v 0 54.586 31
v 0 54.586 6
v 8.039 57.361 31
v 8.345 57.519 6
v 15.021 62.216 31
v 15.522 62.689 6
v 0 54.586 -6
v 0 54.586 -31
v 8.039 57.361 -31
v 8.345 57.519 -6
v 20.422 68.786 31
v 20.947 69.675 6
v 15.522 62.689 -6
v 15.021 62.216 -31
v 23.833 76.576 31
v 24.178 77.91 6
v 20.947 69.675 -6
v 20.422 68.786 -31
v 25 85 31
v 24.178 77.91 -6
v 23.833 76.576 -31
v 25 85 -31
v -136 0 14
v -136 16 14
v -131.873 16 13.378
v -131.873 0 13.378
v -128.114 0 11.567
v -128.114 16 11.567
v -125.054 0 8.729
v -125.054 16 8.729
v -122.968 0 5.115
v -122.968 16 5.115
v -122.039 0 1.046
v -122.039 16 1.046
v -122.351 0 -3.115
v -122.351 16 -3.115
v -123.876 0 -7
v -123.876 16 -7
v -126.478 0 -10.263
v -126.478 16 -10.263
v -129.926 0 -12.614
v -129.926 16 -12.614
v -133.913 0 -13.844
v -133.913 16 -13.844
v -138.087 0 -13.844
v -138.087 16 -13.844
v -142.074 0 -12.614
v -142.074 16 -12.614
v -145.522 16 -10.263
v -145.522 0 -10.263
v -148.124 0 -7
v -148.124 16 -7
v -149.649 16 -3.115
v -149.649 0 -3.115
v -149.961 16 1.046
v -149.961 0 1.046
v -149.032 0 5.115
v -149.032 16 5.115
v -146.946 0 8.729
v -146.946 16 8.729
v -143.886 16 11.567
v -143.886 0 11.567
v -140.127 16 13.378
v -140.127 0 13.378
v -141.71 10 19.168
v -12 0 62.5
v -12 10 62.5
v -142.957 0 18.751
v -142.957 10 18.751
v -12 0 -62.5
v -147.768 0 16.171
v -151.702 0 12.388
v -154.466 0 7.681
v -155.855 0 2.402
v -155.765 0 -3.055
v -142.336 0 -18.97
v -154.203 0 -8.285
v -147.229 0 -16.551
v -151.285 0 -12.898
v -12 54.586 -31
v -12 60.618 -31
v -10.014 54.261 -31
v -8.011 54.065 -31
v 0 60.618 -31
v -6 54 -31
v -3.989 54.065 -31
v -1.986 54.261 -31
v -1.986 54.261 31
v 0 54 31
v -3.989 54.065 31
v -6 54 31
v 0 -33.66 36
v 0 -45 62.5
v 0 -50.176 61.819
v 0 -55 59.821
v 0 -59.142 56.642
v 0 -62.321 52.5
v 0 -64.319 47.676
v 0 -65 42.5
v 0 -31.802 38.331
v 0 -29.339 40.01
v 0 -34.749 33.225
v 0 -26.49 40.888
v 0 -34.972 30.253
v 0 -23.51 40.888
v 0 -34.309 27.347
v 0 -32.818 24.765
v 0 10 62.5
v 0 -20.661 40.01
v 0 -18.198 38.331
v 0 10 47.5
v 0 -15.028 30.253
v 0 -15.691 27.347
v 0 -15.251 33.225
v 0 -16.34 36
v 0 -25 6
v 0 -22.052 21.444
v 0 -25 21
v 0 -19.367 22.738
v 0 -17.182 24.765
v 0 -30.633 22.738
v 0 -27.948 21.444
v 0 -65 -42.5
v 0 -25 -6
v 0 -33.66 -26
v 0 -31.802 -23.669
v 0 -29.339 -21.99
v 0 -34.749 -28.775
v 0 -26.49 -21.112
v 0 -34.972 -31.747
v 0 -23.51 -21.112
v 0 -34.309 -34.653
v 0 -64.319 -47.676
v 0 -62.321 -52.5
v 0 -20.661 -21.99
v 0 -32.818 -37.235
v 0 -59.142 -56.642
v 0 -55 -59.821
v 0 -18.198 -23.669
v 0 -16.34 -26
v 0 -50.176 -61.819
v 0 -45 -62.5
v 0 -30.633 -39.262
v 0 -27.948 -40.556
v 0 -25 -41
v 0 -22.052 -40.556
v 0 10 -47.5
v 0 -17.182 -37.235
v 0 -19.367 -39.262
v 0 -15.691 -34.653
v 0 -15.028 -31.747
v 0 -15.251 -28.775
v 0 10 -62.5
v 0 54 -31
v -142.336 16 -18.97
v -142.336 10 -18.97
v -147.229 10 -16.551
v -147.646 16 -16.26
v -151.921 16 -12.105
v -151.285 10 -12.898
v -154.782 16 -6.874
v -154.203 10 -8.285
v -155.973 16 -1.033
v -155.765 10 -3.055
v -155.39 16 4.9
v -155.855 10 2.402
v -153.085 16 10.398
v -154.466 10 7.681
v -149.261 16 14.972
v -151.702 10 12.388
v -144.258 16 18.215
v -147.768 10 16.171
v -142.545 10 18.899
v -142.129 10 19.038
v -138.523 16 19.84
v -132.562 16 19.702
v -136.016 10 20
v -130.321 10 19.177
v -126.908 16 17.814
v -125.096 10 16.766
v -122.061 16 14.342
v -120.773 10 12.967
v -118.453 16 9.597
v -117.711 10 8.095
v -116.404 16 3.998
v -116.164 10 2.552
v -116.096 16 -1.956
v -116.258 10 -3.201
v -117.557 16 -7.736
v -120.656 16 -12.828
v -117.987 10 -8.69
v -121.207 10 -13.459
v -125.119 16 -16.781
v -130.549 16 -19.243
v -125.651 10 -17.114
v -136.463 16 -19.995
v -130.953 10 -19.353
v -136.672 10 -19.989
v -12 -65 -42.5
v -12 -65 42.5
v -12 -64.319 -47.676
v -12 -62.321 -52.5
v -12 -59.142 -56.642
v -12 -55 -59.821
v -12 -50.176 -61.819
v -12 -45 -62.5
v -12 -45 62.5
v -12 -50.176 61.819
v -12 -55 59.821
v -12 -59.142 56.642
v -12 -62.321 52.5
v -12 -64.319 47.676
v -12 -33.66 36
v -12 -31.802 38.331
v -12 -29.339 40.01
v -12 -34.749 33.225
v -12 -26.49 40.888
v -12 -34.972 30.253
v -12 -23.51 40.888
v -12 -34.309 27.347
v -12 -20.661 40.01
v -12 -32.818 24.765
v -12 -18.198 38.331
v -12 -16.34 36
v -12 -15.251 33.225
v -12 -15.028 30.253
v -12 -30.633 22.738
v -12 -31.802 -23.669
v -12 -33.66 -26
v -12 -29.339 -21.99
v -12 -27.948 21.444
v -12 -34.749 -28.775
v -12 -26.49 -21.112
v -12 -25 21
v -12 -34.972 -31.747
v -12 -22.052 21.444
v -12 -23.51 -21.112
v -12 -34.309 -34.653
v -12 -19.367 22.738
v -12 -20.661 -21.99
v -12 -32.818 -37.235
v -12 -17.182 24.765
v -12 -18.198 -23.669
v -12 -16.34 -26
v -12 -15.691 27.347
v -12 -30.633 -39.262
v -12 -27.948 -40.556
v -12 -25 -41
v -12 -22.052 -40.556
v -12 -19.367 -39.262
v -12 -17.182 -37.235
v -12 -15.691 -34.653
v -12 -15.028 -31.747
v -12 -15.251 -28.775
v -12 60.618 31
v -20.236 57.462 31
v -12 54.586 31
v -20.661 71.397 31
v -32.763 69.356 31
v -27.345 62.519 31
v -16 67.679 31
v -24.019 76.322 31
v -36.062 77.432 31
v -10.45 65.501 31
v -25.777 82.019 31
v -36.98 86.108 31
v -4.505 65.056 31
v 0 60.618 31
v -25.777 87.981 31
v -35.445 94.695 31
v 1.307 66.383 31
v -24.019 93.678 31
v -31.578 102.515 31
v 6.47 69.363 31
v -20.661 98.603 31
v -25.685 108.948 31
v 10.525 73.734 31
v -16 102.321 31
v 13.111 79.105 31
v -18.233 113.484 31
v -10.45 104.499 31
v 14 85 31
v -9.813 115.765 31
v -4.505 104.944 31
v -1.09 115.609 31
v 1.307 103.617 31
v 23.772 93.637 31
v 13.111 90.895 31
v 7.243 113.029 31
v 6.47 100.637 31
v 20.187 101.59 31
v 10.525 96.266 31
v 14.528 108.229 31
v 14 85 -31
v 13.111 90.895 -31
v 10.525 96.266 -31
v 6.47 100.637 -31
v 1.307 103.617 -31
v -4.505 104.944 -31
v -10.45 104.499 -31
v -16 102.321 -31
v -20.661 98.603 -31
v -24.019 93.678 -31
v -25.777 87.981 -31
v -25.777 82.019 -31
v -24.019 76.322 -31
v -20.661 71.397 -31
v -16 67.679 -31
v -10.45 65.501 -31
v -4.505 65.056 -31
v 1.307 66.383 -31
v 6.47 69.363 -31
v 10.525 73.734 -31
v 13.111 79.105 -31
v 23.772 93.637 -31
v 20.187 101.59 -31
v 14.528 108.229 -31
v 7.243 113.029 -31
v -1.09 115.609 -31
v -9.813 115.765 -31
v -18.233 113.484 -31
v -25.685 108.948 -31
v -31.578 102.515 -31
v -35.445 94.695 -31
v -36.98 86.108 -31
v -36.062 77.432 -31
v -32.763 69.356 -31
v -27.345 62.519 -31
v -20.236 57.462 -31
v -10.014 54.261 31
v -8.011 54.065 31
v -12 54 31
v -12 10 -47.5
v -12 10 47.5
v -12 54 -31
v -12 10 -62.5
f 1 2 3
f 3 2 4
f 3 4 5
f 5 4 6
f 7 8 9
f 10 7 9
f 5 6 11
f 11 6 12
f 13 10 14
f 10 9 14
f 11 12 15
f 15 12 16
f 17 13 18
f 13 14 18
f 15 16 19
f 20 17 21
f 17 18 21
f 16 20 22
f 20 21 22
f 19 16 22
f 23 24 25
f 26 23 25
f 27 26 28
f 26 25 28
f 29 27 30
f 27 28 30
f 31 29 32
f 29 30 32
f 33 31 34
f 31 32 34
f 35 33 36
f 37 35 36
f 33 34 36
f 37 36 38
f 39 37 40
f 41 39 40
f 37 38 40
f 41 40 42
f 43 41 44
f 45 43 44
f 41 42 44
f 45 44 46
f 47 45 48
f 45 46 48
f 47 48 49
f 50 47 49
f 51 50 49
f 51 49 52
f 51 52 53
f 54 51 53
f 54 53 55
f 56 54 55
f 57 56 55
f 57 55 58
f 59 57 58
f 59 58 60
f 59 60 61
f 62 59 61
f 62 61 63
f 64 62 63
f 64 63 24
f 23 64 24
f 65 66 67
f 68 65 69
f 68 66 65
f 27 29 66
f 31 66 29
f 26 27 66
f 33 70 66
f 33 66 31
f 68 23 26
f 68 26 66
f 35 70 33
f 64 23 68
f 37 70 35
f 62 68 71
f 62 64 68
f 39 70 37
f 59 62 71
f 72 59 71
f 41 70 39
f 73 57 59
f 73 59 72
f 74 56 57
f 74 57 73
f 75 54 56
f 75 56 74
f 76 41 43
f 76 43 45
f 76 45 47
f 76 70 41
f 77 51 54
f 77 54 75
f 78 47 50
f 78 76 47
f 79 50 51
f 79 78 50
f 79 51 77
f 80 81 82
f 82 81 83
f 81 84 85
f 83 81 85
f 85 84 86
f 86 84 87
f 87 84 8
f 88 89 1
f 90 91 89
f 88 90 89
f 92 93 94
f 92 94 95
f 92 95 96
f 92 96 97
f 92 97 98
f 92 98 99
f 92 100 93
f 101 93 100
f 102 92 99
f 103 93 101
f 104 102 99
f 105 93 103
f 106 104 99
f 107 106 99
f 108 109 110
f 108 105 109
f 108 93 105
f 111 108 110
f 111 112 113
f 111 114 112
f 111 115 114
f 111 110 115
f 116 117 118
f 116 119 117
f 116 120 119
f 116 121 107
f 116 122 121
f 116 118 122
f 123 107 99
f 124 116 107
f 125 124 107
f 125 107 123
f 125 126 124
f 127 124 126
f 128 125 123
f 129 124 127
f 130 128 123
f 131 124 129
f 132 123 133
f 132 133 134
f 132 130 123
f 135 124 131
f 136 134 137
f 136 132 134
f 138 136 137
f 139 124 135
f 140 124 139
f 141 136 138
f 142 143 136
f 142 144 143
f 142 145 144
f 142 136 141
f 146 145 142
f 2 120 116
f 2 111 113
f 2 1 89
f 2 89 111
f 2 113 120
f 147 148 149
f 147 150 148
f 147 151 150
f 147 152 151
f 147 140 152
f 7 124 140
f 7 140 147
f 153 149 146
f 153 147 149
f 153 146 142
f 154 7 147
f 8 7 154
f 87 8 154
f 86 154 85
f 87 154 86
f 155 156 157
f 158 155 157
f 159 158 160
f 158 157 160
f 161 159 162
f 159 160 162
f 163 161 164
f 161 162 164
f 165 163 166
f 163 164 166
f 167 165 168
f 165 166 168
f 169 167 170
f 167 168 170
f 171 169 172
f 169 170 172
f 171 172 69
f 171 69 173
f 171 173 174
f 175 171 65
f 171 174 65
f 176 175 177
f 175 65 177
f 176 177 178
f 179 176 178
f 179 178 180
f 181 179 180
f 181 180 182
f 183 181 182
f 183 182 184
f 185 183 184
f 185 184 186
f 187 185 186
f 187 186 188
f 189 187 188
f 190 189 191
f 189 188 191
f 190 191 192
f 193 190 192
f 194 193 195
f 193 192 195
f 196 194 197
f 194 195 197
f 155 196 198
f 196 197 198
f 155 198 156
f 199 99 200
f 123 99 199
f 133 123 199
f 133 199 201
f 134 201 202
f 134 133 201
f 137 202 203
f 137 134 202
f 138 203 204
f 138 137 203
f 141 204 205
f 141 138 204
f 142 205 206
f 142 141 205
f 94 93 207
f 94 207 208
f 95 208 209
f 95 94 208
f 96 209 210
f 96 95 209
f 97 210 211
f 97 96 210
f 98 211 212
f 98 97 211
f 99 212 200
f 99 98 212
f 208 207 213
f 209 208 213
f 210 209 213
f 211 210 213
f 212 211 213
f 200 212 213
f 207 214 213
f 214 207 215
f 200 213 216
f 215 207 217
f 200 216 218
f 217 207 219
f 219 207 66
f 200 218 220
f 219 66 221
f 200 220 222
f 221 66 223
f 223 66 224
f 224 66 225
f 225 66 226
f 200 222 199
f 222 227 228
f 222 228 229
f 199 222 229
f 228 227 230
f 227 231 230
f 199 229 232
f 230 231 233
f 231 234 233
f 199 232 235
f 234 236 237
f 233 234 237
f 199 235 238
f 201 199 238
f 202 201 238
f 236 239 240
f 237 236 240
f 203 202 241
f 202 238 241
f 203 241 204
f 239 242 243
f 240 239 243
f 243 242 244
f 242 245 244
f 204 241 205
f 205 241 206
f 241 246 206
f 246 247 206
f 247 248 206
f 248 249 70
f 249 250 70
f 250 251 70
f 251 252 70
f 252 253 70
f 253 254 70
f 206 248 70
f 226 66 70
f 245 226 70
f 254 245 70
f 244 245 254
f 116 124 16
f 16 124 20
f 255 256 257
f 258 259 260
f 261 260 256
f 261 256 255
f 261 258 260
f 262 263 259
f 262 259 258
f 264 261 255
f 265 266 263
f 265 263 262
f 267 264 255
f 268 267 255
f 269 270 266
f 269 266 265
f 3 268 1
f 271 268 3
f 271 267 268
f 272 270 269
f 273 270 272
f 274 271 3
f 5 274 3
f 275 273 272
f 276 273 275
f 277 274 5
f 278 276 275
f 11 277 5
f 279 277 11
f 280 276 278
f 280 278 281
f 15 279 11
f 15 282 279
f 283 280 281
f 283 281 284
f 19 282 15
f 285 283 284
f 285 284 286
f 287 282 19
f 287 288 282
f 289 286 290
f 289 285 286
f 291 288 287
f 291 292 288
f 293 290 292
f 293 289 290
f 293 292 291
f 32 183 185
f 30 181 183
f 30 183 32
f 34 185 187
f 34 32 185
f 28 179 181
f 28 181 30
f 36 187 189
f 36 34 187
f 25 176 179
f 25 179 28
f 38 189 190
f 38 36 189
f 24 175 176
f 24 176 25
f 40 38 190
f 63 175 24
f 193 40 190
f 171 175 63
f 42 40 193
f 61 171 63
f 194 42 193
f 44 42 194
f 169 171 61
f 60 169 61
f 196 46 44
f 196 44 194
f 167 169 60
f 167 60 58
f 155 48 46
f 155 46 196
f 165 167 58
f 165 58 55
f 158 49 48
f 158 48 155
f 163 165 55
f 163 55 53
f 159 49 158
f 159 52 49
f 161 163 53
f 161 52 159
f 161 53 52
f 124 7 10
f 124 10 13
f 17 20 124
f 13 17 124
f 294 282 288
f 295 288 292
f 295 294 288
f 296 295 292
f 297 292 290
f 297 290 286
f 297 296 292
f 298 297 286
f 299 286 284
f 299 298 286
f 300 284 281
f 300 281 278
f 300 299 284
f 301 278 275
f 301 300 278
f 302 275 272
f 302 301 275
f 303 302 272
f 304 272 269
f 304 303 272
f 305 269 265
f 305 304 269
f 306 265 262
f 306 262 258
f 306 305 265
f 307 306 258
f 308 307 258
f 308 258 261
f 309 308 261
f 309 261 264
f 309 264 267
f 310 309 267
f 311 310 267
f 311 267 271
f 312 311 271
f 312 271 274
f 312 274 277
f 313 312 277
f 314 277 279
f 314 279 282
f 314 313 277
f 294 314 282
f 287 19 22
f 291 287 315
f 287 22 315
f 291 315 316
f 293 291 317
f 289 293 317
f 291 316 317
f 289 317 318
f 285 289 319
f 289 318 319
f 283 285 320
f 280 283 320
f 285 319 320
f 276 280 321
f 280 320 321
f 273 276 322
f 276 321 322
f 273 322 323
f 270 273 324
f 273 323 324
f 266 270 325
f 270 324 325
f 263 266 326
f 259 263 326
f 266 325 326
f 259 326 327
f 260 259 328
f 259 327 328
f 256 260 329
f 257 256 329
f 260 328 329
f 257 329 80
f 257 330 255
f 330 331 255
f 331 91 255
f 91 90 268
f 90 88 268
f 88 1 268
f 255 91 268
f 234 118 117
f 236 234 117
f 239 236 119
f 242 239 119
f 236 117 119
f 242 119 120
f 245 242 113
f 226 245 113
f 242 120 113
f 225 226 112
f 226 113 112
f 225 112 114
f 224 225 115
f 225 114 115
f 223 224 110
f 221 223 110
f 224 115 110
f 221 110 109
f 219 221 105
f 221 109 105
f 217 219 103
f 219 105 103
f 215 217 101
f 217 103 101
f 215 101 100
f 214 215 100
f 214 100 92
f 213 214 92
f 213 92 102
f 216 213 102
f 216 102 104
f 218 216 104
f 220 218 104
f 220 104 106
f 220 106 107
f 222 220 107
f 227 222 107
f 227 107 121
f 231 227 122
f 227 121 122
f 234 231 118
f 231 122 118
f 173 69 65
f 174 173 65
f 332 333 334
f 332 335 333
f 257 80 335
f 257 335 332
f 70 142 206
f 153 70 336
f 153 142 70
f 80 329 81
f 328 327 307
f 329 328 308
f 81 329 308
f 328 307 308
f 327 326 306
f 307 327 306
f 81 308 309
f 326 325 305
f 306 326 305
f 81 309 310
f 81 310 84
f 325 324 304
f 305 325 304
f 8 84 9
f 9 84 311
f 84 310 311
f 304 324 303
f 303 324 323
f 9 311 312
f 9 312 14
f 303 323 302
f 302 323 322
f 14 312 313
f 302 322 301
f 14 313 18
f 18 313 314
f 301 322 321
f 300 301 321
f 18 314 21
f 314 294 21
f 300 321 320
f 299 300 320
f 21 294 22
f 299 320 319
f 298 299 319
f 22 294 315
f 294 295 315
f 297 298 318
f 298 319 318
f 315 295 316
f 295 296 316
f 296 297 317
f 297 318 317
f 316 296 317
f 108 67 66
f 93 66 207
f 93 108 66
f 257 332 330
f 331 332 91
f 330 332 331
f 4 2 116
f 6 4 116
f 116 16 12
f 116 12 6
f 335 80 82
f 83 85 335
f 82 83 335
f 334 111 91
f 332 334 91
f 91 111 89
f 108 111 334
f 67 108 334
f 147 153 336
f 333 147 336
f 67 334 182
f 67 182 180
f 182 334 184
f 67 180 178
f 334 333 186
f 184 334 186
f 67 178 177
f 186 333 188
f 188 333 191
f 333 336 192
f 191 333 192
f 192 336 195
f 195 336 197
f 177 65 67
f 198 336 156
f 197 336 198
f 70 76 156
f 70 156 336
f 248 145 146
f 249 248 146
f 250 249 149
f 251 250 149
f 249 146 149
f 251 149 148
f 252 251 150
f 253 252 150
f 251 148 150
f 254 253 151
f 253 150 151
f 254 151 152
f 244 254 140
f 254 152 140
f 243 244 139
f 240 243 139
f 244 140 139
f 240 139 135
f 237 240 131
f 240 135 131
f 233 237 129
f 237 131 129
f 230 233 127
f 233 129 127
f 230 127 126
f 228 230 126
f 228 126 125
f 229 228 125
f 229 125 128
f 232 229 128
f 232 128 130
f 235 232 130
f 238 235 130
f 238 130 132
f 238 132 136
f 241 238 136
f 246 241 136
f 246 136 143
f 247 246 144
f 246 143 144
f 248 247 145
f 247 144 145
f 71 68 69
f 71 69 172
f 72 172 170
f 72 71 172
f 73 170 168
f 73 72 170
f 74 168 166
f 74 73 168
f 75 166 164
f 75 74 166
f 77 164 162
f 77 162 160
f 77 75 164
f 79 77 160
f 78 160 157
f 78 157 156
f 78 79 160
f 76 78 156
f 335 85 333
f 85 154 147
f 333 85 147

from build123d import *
from build123d.topology import SkipClean

# Parameters (mm, degrees)
BOSS_EXTRUDE1_DEPTH      = 10
SKETCH2_R                = 20
BOSS_EXTRUDE2_DEPTH      = 6
CUT_EXTRUDE1_REACH       = 170.814
SKETCH3_R                = 14
BOSS_EXTRUDE3_DEPTH      = 31
BOSS_EXTRUDE3_DEPTH_BACK = 31
SKETCH4_R                = 31
SKETCH4_R_2              = 20
BOSS_EXTRUDE4_DEPTH      = 12
SKETCH7_R                = 10
BOSS_EXTRUDE5_DEPTH      = 12
BOSS_EXTRUDE6_DEPTH      = 6
BOSS_EXTRUDE6_DEPTH_BACK = 6


with BuildPart() as part:
    # Sketch1 → Boss-Extrude1 (new body)
    with BuildSketch(Plane(origin=(0, 0, 0), x_dir=(1, 0, 0), z_dir=(0, 1, 0))):
        with BuildLine():
            Line((0, 0), (0, -62.5))
            Line((0, -62.5), (-12, -62.5))
            Line((-12, -62.5), (-142.957379404, -18.750863229))
            ThreePointArc((-142.957379404, -18.750863229), (-155.997283991, 0.329595189), (-142.335664896, 18.969959154))
            Line((-142.335664896, 18.969959154), (-12, 62.5))
            Line((-12, 62.5), (0, 62.5))
            Line((0, 62.5), (0, 0))
        make_face()
    extrude(amount=BOSS_EXTRUDE1_DEPTH)

    # Sketch2 → Boss-Extrude2 (add)
    with SkipClean():  # the faces are left unmerged after this step: merging them gives an invalid solid
        with BuildSketch(Plane(origin=(0, 10, 0), x_dir=(1, 0, 0), z_dir=(0, 1, 0))):
            with Locations((-136, 0)):
                Circle(SKETCH2_R)
        extrude(amount=BOSS_EXTRUDE2_DEPTH)

    # Sketch3 → Cut-Extrude1 (cut, up to next)
    with BuildSketch(Plane(origin=(0, 16, 0), x_dir=(1, 0, 0), z_dir=(0, 1, 0)), mode=Mode.PRIVATE) as cut_extrude1_sk1:
        with Locations((-136, 0)):
            Circle(SKETCH3_R)
    cut_extrude1_tool1 = extrude(cut_extrude1_sk1.sketch, amount=-CUT_EXTRUDE1_REACH, mode=Mode.PRIVATE) & part.part
    add(cut_extrude1_tool1.solids().sort_by_distance((-136, 16, 0))[0], mode=Mode.SUBTRACT)

    # Sketch5 → Boss-Extrude4 (add)
    with SkipClean():  # the faces are left unmerged after this step: merging them gives an invalid solid
        with BuildSketch(Plane(origin=(0, 0, 0), x_dir=(0, 0, -1), z_dir=(1, 0, 0))):
            Polygon((-47.5, 10), (-31, 54), (-31, 60.618293766), (31, 60.618293766), (31, 54), (47.5, 10), align=None)
        extrude(amount=-BOSS_EXTRUDE4_DEPTH)

    # Sketch7 → Boss-Extrude5 (add)
    with SkipClean():  # the faces are left unmerged after this step: merging them gives an invalid solid
        with BuildSketch(Plane(origin=(0, 0, 0), x_dir=(0, 0, -1), z_dir=(1, 0, 0))):
            with BuildLine():
                Line((-62.5, 0), (-62.5, -45))
                ThreePointArc((-62.5, -45), (-56.642135624, -59.142135624), (-42.5, -65))
                Line((-42.5, -65), (42.5, -65))
                ThreePointArc((42.5, -65), (56.642135624, -59.142135624), (62.5, -45))
                Line((62.5, -45), (62.5, 0))
                Line((62.5, 0), (-62.5, 0))
            make_face()
            with Locations((-31, -25)):
                Circle(SKETCH7_R, mode=Mode.SUBTRACT)
            with Locations((31, -25)):
                Circle(SKETCH7_R, mode=Mode.SUBTRACT)
        extrude(amount=-BOSS_EXTRUDE5_DEPTH)



with BuildPart() as body_2:
    # Sketch4 → Boss-Extrude3 (new, two sides: drawn at the far end of the back side and taken through both)
    with BuildSketch(Plane.XY.offset(-BOSS_EXTRUDE3_DEPTH_BACK)):
        with Locations((-6, 85)):
            Circle(SKETCH4_R)
        with Locations((-6, 85)):
            Circle(SKETCH4_R_2, mode=Mode.SUBTRACT)
    extrude(amount=BOSS_EXTRUDE3_DEPTH + BOSS_EXTRUDE3_DEPTH_BACK)


with BuildPart() as part_1:
    with SkipClean():  # the faces are left unmerged after this step: merging them gives an invalid solid
        add(part.part)

        add(body_2.part)  # Boss-Extrude6 merges body 2
        # Sketch8 → Boss-Extrude6 (add, two sides: drawn at the far end of the back side and taken through both)
        with BuildSketch(Plane.XY.offset(-BOSS_EXTRUDE6_DEPTH_BACK)):
            with BuildLine():
                Line((0, -25), (24.178270058, 77.909723821))
                ThreePointArc((24.178270058, 77.909723821), (15.52239867, 62.688873729), (0, 54.586187349))
                Line((0, 54.586187349), (0, -25))
            make_face()
        extrude(amount=BOSS_EXTRUDE6_DEPTH + BOSS_EXTRUDE6_DEPTH_BACK)


solid = part_1.part
